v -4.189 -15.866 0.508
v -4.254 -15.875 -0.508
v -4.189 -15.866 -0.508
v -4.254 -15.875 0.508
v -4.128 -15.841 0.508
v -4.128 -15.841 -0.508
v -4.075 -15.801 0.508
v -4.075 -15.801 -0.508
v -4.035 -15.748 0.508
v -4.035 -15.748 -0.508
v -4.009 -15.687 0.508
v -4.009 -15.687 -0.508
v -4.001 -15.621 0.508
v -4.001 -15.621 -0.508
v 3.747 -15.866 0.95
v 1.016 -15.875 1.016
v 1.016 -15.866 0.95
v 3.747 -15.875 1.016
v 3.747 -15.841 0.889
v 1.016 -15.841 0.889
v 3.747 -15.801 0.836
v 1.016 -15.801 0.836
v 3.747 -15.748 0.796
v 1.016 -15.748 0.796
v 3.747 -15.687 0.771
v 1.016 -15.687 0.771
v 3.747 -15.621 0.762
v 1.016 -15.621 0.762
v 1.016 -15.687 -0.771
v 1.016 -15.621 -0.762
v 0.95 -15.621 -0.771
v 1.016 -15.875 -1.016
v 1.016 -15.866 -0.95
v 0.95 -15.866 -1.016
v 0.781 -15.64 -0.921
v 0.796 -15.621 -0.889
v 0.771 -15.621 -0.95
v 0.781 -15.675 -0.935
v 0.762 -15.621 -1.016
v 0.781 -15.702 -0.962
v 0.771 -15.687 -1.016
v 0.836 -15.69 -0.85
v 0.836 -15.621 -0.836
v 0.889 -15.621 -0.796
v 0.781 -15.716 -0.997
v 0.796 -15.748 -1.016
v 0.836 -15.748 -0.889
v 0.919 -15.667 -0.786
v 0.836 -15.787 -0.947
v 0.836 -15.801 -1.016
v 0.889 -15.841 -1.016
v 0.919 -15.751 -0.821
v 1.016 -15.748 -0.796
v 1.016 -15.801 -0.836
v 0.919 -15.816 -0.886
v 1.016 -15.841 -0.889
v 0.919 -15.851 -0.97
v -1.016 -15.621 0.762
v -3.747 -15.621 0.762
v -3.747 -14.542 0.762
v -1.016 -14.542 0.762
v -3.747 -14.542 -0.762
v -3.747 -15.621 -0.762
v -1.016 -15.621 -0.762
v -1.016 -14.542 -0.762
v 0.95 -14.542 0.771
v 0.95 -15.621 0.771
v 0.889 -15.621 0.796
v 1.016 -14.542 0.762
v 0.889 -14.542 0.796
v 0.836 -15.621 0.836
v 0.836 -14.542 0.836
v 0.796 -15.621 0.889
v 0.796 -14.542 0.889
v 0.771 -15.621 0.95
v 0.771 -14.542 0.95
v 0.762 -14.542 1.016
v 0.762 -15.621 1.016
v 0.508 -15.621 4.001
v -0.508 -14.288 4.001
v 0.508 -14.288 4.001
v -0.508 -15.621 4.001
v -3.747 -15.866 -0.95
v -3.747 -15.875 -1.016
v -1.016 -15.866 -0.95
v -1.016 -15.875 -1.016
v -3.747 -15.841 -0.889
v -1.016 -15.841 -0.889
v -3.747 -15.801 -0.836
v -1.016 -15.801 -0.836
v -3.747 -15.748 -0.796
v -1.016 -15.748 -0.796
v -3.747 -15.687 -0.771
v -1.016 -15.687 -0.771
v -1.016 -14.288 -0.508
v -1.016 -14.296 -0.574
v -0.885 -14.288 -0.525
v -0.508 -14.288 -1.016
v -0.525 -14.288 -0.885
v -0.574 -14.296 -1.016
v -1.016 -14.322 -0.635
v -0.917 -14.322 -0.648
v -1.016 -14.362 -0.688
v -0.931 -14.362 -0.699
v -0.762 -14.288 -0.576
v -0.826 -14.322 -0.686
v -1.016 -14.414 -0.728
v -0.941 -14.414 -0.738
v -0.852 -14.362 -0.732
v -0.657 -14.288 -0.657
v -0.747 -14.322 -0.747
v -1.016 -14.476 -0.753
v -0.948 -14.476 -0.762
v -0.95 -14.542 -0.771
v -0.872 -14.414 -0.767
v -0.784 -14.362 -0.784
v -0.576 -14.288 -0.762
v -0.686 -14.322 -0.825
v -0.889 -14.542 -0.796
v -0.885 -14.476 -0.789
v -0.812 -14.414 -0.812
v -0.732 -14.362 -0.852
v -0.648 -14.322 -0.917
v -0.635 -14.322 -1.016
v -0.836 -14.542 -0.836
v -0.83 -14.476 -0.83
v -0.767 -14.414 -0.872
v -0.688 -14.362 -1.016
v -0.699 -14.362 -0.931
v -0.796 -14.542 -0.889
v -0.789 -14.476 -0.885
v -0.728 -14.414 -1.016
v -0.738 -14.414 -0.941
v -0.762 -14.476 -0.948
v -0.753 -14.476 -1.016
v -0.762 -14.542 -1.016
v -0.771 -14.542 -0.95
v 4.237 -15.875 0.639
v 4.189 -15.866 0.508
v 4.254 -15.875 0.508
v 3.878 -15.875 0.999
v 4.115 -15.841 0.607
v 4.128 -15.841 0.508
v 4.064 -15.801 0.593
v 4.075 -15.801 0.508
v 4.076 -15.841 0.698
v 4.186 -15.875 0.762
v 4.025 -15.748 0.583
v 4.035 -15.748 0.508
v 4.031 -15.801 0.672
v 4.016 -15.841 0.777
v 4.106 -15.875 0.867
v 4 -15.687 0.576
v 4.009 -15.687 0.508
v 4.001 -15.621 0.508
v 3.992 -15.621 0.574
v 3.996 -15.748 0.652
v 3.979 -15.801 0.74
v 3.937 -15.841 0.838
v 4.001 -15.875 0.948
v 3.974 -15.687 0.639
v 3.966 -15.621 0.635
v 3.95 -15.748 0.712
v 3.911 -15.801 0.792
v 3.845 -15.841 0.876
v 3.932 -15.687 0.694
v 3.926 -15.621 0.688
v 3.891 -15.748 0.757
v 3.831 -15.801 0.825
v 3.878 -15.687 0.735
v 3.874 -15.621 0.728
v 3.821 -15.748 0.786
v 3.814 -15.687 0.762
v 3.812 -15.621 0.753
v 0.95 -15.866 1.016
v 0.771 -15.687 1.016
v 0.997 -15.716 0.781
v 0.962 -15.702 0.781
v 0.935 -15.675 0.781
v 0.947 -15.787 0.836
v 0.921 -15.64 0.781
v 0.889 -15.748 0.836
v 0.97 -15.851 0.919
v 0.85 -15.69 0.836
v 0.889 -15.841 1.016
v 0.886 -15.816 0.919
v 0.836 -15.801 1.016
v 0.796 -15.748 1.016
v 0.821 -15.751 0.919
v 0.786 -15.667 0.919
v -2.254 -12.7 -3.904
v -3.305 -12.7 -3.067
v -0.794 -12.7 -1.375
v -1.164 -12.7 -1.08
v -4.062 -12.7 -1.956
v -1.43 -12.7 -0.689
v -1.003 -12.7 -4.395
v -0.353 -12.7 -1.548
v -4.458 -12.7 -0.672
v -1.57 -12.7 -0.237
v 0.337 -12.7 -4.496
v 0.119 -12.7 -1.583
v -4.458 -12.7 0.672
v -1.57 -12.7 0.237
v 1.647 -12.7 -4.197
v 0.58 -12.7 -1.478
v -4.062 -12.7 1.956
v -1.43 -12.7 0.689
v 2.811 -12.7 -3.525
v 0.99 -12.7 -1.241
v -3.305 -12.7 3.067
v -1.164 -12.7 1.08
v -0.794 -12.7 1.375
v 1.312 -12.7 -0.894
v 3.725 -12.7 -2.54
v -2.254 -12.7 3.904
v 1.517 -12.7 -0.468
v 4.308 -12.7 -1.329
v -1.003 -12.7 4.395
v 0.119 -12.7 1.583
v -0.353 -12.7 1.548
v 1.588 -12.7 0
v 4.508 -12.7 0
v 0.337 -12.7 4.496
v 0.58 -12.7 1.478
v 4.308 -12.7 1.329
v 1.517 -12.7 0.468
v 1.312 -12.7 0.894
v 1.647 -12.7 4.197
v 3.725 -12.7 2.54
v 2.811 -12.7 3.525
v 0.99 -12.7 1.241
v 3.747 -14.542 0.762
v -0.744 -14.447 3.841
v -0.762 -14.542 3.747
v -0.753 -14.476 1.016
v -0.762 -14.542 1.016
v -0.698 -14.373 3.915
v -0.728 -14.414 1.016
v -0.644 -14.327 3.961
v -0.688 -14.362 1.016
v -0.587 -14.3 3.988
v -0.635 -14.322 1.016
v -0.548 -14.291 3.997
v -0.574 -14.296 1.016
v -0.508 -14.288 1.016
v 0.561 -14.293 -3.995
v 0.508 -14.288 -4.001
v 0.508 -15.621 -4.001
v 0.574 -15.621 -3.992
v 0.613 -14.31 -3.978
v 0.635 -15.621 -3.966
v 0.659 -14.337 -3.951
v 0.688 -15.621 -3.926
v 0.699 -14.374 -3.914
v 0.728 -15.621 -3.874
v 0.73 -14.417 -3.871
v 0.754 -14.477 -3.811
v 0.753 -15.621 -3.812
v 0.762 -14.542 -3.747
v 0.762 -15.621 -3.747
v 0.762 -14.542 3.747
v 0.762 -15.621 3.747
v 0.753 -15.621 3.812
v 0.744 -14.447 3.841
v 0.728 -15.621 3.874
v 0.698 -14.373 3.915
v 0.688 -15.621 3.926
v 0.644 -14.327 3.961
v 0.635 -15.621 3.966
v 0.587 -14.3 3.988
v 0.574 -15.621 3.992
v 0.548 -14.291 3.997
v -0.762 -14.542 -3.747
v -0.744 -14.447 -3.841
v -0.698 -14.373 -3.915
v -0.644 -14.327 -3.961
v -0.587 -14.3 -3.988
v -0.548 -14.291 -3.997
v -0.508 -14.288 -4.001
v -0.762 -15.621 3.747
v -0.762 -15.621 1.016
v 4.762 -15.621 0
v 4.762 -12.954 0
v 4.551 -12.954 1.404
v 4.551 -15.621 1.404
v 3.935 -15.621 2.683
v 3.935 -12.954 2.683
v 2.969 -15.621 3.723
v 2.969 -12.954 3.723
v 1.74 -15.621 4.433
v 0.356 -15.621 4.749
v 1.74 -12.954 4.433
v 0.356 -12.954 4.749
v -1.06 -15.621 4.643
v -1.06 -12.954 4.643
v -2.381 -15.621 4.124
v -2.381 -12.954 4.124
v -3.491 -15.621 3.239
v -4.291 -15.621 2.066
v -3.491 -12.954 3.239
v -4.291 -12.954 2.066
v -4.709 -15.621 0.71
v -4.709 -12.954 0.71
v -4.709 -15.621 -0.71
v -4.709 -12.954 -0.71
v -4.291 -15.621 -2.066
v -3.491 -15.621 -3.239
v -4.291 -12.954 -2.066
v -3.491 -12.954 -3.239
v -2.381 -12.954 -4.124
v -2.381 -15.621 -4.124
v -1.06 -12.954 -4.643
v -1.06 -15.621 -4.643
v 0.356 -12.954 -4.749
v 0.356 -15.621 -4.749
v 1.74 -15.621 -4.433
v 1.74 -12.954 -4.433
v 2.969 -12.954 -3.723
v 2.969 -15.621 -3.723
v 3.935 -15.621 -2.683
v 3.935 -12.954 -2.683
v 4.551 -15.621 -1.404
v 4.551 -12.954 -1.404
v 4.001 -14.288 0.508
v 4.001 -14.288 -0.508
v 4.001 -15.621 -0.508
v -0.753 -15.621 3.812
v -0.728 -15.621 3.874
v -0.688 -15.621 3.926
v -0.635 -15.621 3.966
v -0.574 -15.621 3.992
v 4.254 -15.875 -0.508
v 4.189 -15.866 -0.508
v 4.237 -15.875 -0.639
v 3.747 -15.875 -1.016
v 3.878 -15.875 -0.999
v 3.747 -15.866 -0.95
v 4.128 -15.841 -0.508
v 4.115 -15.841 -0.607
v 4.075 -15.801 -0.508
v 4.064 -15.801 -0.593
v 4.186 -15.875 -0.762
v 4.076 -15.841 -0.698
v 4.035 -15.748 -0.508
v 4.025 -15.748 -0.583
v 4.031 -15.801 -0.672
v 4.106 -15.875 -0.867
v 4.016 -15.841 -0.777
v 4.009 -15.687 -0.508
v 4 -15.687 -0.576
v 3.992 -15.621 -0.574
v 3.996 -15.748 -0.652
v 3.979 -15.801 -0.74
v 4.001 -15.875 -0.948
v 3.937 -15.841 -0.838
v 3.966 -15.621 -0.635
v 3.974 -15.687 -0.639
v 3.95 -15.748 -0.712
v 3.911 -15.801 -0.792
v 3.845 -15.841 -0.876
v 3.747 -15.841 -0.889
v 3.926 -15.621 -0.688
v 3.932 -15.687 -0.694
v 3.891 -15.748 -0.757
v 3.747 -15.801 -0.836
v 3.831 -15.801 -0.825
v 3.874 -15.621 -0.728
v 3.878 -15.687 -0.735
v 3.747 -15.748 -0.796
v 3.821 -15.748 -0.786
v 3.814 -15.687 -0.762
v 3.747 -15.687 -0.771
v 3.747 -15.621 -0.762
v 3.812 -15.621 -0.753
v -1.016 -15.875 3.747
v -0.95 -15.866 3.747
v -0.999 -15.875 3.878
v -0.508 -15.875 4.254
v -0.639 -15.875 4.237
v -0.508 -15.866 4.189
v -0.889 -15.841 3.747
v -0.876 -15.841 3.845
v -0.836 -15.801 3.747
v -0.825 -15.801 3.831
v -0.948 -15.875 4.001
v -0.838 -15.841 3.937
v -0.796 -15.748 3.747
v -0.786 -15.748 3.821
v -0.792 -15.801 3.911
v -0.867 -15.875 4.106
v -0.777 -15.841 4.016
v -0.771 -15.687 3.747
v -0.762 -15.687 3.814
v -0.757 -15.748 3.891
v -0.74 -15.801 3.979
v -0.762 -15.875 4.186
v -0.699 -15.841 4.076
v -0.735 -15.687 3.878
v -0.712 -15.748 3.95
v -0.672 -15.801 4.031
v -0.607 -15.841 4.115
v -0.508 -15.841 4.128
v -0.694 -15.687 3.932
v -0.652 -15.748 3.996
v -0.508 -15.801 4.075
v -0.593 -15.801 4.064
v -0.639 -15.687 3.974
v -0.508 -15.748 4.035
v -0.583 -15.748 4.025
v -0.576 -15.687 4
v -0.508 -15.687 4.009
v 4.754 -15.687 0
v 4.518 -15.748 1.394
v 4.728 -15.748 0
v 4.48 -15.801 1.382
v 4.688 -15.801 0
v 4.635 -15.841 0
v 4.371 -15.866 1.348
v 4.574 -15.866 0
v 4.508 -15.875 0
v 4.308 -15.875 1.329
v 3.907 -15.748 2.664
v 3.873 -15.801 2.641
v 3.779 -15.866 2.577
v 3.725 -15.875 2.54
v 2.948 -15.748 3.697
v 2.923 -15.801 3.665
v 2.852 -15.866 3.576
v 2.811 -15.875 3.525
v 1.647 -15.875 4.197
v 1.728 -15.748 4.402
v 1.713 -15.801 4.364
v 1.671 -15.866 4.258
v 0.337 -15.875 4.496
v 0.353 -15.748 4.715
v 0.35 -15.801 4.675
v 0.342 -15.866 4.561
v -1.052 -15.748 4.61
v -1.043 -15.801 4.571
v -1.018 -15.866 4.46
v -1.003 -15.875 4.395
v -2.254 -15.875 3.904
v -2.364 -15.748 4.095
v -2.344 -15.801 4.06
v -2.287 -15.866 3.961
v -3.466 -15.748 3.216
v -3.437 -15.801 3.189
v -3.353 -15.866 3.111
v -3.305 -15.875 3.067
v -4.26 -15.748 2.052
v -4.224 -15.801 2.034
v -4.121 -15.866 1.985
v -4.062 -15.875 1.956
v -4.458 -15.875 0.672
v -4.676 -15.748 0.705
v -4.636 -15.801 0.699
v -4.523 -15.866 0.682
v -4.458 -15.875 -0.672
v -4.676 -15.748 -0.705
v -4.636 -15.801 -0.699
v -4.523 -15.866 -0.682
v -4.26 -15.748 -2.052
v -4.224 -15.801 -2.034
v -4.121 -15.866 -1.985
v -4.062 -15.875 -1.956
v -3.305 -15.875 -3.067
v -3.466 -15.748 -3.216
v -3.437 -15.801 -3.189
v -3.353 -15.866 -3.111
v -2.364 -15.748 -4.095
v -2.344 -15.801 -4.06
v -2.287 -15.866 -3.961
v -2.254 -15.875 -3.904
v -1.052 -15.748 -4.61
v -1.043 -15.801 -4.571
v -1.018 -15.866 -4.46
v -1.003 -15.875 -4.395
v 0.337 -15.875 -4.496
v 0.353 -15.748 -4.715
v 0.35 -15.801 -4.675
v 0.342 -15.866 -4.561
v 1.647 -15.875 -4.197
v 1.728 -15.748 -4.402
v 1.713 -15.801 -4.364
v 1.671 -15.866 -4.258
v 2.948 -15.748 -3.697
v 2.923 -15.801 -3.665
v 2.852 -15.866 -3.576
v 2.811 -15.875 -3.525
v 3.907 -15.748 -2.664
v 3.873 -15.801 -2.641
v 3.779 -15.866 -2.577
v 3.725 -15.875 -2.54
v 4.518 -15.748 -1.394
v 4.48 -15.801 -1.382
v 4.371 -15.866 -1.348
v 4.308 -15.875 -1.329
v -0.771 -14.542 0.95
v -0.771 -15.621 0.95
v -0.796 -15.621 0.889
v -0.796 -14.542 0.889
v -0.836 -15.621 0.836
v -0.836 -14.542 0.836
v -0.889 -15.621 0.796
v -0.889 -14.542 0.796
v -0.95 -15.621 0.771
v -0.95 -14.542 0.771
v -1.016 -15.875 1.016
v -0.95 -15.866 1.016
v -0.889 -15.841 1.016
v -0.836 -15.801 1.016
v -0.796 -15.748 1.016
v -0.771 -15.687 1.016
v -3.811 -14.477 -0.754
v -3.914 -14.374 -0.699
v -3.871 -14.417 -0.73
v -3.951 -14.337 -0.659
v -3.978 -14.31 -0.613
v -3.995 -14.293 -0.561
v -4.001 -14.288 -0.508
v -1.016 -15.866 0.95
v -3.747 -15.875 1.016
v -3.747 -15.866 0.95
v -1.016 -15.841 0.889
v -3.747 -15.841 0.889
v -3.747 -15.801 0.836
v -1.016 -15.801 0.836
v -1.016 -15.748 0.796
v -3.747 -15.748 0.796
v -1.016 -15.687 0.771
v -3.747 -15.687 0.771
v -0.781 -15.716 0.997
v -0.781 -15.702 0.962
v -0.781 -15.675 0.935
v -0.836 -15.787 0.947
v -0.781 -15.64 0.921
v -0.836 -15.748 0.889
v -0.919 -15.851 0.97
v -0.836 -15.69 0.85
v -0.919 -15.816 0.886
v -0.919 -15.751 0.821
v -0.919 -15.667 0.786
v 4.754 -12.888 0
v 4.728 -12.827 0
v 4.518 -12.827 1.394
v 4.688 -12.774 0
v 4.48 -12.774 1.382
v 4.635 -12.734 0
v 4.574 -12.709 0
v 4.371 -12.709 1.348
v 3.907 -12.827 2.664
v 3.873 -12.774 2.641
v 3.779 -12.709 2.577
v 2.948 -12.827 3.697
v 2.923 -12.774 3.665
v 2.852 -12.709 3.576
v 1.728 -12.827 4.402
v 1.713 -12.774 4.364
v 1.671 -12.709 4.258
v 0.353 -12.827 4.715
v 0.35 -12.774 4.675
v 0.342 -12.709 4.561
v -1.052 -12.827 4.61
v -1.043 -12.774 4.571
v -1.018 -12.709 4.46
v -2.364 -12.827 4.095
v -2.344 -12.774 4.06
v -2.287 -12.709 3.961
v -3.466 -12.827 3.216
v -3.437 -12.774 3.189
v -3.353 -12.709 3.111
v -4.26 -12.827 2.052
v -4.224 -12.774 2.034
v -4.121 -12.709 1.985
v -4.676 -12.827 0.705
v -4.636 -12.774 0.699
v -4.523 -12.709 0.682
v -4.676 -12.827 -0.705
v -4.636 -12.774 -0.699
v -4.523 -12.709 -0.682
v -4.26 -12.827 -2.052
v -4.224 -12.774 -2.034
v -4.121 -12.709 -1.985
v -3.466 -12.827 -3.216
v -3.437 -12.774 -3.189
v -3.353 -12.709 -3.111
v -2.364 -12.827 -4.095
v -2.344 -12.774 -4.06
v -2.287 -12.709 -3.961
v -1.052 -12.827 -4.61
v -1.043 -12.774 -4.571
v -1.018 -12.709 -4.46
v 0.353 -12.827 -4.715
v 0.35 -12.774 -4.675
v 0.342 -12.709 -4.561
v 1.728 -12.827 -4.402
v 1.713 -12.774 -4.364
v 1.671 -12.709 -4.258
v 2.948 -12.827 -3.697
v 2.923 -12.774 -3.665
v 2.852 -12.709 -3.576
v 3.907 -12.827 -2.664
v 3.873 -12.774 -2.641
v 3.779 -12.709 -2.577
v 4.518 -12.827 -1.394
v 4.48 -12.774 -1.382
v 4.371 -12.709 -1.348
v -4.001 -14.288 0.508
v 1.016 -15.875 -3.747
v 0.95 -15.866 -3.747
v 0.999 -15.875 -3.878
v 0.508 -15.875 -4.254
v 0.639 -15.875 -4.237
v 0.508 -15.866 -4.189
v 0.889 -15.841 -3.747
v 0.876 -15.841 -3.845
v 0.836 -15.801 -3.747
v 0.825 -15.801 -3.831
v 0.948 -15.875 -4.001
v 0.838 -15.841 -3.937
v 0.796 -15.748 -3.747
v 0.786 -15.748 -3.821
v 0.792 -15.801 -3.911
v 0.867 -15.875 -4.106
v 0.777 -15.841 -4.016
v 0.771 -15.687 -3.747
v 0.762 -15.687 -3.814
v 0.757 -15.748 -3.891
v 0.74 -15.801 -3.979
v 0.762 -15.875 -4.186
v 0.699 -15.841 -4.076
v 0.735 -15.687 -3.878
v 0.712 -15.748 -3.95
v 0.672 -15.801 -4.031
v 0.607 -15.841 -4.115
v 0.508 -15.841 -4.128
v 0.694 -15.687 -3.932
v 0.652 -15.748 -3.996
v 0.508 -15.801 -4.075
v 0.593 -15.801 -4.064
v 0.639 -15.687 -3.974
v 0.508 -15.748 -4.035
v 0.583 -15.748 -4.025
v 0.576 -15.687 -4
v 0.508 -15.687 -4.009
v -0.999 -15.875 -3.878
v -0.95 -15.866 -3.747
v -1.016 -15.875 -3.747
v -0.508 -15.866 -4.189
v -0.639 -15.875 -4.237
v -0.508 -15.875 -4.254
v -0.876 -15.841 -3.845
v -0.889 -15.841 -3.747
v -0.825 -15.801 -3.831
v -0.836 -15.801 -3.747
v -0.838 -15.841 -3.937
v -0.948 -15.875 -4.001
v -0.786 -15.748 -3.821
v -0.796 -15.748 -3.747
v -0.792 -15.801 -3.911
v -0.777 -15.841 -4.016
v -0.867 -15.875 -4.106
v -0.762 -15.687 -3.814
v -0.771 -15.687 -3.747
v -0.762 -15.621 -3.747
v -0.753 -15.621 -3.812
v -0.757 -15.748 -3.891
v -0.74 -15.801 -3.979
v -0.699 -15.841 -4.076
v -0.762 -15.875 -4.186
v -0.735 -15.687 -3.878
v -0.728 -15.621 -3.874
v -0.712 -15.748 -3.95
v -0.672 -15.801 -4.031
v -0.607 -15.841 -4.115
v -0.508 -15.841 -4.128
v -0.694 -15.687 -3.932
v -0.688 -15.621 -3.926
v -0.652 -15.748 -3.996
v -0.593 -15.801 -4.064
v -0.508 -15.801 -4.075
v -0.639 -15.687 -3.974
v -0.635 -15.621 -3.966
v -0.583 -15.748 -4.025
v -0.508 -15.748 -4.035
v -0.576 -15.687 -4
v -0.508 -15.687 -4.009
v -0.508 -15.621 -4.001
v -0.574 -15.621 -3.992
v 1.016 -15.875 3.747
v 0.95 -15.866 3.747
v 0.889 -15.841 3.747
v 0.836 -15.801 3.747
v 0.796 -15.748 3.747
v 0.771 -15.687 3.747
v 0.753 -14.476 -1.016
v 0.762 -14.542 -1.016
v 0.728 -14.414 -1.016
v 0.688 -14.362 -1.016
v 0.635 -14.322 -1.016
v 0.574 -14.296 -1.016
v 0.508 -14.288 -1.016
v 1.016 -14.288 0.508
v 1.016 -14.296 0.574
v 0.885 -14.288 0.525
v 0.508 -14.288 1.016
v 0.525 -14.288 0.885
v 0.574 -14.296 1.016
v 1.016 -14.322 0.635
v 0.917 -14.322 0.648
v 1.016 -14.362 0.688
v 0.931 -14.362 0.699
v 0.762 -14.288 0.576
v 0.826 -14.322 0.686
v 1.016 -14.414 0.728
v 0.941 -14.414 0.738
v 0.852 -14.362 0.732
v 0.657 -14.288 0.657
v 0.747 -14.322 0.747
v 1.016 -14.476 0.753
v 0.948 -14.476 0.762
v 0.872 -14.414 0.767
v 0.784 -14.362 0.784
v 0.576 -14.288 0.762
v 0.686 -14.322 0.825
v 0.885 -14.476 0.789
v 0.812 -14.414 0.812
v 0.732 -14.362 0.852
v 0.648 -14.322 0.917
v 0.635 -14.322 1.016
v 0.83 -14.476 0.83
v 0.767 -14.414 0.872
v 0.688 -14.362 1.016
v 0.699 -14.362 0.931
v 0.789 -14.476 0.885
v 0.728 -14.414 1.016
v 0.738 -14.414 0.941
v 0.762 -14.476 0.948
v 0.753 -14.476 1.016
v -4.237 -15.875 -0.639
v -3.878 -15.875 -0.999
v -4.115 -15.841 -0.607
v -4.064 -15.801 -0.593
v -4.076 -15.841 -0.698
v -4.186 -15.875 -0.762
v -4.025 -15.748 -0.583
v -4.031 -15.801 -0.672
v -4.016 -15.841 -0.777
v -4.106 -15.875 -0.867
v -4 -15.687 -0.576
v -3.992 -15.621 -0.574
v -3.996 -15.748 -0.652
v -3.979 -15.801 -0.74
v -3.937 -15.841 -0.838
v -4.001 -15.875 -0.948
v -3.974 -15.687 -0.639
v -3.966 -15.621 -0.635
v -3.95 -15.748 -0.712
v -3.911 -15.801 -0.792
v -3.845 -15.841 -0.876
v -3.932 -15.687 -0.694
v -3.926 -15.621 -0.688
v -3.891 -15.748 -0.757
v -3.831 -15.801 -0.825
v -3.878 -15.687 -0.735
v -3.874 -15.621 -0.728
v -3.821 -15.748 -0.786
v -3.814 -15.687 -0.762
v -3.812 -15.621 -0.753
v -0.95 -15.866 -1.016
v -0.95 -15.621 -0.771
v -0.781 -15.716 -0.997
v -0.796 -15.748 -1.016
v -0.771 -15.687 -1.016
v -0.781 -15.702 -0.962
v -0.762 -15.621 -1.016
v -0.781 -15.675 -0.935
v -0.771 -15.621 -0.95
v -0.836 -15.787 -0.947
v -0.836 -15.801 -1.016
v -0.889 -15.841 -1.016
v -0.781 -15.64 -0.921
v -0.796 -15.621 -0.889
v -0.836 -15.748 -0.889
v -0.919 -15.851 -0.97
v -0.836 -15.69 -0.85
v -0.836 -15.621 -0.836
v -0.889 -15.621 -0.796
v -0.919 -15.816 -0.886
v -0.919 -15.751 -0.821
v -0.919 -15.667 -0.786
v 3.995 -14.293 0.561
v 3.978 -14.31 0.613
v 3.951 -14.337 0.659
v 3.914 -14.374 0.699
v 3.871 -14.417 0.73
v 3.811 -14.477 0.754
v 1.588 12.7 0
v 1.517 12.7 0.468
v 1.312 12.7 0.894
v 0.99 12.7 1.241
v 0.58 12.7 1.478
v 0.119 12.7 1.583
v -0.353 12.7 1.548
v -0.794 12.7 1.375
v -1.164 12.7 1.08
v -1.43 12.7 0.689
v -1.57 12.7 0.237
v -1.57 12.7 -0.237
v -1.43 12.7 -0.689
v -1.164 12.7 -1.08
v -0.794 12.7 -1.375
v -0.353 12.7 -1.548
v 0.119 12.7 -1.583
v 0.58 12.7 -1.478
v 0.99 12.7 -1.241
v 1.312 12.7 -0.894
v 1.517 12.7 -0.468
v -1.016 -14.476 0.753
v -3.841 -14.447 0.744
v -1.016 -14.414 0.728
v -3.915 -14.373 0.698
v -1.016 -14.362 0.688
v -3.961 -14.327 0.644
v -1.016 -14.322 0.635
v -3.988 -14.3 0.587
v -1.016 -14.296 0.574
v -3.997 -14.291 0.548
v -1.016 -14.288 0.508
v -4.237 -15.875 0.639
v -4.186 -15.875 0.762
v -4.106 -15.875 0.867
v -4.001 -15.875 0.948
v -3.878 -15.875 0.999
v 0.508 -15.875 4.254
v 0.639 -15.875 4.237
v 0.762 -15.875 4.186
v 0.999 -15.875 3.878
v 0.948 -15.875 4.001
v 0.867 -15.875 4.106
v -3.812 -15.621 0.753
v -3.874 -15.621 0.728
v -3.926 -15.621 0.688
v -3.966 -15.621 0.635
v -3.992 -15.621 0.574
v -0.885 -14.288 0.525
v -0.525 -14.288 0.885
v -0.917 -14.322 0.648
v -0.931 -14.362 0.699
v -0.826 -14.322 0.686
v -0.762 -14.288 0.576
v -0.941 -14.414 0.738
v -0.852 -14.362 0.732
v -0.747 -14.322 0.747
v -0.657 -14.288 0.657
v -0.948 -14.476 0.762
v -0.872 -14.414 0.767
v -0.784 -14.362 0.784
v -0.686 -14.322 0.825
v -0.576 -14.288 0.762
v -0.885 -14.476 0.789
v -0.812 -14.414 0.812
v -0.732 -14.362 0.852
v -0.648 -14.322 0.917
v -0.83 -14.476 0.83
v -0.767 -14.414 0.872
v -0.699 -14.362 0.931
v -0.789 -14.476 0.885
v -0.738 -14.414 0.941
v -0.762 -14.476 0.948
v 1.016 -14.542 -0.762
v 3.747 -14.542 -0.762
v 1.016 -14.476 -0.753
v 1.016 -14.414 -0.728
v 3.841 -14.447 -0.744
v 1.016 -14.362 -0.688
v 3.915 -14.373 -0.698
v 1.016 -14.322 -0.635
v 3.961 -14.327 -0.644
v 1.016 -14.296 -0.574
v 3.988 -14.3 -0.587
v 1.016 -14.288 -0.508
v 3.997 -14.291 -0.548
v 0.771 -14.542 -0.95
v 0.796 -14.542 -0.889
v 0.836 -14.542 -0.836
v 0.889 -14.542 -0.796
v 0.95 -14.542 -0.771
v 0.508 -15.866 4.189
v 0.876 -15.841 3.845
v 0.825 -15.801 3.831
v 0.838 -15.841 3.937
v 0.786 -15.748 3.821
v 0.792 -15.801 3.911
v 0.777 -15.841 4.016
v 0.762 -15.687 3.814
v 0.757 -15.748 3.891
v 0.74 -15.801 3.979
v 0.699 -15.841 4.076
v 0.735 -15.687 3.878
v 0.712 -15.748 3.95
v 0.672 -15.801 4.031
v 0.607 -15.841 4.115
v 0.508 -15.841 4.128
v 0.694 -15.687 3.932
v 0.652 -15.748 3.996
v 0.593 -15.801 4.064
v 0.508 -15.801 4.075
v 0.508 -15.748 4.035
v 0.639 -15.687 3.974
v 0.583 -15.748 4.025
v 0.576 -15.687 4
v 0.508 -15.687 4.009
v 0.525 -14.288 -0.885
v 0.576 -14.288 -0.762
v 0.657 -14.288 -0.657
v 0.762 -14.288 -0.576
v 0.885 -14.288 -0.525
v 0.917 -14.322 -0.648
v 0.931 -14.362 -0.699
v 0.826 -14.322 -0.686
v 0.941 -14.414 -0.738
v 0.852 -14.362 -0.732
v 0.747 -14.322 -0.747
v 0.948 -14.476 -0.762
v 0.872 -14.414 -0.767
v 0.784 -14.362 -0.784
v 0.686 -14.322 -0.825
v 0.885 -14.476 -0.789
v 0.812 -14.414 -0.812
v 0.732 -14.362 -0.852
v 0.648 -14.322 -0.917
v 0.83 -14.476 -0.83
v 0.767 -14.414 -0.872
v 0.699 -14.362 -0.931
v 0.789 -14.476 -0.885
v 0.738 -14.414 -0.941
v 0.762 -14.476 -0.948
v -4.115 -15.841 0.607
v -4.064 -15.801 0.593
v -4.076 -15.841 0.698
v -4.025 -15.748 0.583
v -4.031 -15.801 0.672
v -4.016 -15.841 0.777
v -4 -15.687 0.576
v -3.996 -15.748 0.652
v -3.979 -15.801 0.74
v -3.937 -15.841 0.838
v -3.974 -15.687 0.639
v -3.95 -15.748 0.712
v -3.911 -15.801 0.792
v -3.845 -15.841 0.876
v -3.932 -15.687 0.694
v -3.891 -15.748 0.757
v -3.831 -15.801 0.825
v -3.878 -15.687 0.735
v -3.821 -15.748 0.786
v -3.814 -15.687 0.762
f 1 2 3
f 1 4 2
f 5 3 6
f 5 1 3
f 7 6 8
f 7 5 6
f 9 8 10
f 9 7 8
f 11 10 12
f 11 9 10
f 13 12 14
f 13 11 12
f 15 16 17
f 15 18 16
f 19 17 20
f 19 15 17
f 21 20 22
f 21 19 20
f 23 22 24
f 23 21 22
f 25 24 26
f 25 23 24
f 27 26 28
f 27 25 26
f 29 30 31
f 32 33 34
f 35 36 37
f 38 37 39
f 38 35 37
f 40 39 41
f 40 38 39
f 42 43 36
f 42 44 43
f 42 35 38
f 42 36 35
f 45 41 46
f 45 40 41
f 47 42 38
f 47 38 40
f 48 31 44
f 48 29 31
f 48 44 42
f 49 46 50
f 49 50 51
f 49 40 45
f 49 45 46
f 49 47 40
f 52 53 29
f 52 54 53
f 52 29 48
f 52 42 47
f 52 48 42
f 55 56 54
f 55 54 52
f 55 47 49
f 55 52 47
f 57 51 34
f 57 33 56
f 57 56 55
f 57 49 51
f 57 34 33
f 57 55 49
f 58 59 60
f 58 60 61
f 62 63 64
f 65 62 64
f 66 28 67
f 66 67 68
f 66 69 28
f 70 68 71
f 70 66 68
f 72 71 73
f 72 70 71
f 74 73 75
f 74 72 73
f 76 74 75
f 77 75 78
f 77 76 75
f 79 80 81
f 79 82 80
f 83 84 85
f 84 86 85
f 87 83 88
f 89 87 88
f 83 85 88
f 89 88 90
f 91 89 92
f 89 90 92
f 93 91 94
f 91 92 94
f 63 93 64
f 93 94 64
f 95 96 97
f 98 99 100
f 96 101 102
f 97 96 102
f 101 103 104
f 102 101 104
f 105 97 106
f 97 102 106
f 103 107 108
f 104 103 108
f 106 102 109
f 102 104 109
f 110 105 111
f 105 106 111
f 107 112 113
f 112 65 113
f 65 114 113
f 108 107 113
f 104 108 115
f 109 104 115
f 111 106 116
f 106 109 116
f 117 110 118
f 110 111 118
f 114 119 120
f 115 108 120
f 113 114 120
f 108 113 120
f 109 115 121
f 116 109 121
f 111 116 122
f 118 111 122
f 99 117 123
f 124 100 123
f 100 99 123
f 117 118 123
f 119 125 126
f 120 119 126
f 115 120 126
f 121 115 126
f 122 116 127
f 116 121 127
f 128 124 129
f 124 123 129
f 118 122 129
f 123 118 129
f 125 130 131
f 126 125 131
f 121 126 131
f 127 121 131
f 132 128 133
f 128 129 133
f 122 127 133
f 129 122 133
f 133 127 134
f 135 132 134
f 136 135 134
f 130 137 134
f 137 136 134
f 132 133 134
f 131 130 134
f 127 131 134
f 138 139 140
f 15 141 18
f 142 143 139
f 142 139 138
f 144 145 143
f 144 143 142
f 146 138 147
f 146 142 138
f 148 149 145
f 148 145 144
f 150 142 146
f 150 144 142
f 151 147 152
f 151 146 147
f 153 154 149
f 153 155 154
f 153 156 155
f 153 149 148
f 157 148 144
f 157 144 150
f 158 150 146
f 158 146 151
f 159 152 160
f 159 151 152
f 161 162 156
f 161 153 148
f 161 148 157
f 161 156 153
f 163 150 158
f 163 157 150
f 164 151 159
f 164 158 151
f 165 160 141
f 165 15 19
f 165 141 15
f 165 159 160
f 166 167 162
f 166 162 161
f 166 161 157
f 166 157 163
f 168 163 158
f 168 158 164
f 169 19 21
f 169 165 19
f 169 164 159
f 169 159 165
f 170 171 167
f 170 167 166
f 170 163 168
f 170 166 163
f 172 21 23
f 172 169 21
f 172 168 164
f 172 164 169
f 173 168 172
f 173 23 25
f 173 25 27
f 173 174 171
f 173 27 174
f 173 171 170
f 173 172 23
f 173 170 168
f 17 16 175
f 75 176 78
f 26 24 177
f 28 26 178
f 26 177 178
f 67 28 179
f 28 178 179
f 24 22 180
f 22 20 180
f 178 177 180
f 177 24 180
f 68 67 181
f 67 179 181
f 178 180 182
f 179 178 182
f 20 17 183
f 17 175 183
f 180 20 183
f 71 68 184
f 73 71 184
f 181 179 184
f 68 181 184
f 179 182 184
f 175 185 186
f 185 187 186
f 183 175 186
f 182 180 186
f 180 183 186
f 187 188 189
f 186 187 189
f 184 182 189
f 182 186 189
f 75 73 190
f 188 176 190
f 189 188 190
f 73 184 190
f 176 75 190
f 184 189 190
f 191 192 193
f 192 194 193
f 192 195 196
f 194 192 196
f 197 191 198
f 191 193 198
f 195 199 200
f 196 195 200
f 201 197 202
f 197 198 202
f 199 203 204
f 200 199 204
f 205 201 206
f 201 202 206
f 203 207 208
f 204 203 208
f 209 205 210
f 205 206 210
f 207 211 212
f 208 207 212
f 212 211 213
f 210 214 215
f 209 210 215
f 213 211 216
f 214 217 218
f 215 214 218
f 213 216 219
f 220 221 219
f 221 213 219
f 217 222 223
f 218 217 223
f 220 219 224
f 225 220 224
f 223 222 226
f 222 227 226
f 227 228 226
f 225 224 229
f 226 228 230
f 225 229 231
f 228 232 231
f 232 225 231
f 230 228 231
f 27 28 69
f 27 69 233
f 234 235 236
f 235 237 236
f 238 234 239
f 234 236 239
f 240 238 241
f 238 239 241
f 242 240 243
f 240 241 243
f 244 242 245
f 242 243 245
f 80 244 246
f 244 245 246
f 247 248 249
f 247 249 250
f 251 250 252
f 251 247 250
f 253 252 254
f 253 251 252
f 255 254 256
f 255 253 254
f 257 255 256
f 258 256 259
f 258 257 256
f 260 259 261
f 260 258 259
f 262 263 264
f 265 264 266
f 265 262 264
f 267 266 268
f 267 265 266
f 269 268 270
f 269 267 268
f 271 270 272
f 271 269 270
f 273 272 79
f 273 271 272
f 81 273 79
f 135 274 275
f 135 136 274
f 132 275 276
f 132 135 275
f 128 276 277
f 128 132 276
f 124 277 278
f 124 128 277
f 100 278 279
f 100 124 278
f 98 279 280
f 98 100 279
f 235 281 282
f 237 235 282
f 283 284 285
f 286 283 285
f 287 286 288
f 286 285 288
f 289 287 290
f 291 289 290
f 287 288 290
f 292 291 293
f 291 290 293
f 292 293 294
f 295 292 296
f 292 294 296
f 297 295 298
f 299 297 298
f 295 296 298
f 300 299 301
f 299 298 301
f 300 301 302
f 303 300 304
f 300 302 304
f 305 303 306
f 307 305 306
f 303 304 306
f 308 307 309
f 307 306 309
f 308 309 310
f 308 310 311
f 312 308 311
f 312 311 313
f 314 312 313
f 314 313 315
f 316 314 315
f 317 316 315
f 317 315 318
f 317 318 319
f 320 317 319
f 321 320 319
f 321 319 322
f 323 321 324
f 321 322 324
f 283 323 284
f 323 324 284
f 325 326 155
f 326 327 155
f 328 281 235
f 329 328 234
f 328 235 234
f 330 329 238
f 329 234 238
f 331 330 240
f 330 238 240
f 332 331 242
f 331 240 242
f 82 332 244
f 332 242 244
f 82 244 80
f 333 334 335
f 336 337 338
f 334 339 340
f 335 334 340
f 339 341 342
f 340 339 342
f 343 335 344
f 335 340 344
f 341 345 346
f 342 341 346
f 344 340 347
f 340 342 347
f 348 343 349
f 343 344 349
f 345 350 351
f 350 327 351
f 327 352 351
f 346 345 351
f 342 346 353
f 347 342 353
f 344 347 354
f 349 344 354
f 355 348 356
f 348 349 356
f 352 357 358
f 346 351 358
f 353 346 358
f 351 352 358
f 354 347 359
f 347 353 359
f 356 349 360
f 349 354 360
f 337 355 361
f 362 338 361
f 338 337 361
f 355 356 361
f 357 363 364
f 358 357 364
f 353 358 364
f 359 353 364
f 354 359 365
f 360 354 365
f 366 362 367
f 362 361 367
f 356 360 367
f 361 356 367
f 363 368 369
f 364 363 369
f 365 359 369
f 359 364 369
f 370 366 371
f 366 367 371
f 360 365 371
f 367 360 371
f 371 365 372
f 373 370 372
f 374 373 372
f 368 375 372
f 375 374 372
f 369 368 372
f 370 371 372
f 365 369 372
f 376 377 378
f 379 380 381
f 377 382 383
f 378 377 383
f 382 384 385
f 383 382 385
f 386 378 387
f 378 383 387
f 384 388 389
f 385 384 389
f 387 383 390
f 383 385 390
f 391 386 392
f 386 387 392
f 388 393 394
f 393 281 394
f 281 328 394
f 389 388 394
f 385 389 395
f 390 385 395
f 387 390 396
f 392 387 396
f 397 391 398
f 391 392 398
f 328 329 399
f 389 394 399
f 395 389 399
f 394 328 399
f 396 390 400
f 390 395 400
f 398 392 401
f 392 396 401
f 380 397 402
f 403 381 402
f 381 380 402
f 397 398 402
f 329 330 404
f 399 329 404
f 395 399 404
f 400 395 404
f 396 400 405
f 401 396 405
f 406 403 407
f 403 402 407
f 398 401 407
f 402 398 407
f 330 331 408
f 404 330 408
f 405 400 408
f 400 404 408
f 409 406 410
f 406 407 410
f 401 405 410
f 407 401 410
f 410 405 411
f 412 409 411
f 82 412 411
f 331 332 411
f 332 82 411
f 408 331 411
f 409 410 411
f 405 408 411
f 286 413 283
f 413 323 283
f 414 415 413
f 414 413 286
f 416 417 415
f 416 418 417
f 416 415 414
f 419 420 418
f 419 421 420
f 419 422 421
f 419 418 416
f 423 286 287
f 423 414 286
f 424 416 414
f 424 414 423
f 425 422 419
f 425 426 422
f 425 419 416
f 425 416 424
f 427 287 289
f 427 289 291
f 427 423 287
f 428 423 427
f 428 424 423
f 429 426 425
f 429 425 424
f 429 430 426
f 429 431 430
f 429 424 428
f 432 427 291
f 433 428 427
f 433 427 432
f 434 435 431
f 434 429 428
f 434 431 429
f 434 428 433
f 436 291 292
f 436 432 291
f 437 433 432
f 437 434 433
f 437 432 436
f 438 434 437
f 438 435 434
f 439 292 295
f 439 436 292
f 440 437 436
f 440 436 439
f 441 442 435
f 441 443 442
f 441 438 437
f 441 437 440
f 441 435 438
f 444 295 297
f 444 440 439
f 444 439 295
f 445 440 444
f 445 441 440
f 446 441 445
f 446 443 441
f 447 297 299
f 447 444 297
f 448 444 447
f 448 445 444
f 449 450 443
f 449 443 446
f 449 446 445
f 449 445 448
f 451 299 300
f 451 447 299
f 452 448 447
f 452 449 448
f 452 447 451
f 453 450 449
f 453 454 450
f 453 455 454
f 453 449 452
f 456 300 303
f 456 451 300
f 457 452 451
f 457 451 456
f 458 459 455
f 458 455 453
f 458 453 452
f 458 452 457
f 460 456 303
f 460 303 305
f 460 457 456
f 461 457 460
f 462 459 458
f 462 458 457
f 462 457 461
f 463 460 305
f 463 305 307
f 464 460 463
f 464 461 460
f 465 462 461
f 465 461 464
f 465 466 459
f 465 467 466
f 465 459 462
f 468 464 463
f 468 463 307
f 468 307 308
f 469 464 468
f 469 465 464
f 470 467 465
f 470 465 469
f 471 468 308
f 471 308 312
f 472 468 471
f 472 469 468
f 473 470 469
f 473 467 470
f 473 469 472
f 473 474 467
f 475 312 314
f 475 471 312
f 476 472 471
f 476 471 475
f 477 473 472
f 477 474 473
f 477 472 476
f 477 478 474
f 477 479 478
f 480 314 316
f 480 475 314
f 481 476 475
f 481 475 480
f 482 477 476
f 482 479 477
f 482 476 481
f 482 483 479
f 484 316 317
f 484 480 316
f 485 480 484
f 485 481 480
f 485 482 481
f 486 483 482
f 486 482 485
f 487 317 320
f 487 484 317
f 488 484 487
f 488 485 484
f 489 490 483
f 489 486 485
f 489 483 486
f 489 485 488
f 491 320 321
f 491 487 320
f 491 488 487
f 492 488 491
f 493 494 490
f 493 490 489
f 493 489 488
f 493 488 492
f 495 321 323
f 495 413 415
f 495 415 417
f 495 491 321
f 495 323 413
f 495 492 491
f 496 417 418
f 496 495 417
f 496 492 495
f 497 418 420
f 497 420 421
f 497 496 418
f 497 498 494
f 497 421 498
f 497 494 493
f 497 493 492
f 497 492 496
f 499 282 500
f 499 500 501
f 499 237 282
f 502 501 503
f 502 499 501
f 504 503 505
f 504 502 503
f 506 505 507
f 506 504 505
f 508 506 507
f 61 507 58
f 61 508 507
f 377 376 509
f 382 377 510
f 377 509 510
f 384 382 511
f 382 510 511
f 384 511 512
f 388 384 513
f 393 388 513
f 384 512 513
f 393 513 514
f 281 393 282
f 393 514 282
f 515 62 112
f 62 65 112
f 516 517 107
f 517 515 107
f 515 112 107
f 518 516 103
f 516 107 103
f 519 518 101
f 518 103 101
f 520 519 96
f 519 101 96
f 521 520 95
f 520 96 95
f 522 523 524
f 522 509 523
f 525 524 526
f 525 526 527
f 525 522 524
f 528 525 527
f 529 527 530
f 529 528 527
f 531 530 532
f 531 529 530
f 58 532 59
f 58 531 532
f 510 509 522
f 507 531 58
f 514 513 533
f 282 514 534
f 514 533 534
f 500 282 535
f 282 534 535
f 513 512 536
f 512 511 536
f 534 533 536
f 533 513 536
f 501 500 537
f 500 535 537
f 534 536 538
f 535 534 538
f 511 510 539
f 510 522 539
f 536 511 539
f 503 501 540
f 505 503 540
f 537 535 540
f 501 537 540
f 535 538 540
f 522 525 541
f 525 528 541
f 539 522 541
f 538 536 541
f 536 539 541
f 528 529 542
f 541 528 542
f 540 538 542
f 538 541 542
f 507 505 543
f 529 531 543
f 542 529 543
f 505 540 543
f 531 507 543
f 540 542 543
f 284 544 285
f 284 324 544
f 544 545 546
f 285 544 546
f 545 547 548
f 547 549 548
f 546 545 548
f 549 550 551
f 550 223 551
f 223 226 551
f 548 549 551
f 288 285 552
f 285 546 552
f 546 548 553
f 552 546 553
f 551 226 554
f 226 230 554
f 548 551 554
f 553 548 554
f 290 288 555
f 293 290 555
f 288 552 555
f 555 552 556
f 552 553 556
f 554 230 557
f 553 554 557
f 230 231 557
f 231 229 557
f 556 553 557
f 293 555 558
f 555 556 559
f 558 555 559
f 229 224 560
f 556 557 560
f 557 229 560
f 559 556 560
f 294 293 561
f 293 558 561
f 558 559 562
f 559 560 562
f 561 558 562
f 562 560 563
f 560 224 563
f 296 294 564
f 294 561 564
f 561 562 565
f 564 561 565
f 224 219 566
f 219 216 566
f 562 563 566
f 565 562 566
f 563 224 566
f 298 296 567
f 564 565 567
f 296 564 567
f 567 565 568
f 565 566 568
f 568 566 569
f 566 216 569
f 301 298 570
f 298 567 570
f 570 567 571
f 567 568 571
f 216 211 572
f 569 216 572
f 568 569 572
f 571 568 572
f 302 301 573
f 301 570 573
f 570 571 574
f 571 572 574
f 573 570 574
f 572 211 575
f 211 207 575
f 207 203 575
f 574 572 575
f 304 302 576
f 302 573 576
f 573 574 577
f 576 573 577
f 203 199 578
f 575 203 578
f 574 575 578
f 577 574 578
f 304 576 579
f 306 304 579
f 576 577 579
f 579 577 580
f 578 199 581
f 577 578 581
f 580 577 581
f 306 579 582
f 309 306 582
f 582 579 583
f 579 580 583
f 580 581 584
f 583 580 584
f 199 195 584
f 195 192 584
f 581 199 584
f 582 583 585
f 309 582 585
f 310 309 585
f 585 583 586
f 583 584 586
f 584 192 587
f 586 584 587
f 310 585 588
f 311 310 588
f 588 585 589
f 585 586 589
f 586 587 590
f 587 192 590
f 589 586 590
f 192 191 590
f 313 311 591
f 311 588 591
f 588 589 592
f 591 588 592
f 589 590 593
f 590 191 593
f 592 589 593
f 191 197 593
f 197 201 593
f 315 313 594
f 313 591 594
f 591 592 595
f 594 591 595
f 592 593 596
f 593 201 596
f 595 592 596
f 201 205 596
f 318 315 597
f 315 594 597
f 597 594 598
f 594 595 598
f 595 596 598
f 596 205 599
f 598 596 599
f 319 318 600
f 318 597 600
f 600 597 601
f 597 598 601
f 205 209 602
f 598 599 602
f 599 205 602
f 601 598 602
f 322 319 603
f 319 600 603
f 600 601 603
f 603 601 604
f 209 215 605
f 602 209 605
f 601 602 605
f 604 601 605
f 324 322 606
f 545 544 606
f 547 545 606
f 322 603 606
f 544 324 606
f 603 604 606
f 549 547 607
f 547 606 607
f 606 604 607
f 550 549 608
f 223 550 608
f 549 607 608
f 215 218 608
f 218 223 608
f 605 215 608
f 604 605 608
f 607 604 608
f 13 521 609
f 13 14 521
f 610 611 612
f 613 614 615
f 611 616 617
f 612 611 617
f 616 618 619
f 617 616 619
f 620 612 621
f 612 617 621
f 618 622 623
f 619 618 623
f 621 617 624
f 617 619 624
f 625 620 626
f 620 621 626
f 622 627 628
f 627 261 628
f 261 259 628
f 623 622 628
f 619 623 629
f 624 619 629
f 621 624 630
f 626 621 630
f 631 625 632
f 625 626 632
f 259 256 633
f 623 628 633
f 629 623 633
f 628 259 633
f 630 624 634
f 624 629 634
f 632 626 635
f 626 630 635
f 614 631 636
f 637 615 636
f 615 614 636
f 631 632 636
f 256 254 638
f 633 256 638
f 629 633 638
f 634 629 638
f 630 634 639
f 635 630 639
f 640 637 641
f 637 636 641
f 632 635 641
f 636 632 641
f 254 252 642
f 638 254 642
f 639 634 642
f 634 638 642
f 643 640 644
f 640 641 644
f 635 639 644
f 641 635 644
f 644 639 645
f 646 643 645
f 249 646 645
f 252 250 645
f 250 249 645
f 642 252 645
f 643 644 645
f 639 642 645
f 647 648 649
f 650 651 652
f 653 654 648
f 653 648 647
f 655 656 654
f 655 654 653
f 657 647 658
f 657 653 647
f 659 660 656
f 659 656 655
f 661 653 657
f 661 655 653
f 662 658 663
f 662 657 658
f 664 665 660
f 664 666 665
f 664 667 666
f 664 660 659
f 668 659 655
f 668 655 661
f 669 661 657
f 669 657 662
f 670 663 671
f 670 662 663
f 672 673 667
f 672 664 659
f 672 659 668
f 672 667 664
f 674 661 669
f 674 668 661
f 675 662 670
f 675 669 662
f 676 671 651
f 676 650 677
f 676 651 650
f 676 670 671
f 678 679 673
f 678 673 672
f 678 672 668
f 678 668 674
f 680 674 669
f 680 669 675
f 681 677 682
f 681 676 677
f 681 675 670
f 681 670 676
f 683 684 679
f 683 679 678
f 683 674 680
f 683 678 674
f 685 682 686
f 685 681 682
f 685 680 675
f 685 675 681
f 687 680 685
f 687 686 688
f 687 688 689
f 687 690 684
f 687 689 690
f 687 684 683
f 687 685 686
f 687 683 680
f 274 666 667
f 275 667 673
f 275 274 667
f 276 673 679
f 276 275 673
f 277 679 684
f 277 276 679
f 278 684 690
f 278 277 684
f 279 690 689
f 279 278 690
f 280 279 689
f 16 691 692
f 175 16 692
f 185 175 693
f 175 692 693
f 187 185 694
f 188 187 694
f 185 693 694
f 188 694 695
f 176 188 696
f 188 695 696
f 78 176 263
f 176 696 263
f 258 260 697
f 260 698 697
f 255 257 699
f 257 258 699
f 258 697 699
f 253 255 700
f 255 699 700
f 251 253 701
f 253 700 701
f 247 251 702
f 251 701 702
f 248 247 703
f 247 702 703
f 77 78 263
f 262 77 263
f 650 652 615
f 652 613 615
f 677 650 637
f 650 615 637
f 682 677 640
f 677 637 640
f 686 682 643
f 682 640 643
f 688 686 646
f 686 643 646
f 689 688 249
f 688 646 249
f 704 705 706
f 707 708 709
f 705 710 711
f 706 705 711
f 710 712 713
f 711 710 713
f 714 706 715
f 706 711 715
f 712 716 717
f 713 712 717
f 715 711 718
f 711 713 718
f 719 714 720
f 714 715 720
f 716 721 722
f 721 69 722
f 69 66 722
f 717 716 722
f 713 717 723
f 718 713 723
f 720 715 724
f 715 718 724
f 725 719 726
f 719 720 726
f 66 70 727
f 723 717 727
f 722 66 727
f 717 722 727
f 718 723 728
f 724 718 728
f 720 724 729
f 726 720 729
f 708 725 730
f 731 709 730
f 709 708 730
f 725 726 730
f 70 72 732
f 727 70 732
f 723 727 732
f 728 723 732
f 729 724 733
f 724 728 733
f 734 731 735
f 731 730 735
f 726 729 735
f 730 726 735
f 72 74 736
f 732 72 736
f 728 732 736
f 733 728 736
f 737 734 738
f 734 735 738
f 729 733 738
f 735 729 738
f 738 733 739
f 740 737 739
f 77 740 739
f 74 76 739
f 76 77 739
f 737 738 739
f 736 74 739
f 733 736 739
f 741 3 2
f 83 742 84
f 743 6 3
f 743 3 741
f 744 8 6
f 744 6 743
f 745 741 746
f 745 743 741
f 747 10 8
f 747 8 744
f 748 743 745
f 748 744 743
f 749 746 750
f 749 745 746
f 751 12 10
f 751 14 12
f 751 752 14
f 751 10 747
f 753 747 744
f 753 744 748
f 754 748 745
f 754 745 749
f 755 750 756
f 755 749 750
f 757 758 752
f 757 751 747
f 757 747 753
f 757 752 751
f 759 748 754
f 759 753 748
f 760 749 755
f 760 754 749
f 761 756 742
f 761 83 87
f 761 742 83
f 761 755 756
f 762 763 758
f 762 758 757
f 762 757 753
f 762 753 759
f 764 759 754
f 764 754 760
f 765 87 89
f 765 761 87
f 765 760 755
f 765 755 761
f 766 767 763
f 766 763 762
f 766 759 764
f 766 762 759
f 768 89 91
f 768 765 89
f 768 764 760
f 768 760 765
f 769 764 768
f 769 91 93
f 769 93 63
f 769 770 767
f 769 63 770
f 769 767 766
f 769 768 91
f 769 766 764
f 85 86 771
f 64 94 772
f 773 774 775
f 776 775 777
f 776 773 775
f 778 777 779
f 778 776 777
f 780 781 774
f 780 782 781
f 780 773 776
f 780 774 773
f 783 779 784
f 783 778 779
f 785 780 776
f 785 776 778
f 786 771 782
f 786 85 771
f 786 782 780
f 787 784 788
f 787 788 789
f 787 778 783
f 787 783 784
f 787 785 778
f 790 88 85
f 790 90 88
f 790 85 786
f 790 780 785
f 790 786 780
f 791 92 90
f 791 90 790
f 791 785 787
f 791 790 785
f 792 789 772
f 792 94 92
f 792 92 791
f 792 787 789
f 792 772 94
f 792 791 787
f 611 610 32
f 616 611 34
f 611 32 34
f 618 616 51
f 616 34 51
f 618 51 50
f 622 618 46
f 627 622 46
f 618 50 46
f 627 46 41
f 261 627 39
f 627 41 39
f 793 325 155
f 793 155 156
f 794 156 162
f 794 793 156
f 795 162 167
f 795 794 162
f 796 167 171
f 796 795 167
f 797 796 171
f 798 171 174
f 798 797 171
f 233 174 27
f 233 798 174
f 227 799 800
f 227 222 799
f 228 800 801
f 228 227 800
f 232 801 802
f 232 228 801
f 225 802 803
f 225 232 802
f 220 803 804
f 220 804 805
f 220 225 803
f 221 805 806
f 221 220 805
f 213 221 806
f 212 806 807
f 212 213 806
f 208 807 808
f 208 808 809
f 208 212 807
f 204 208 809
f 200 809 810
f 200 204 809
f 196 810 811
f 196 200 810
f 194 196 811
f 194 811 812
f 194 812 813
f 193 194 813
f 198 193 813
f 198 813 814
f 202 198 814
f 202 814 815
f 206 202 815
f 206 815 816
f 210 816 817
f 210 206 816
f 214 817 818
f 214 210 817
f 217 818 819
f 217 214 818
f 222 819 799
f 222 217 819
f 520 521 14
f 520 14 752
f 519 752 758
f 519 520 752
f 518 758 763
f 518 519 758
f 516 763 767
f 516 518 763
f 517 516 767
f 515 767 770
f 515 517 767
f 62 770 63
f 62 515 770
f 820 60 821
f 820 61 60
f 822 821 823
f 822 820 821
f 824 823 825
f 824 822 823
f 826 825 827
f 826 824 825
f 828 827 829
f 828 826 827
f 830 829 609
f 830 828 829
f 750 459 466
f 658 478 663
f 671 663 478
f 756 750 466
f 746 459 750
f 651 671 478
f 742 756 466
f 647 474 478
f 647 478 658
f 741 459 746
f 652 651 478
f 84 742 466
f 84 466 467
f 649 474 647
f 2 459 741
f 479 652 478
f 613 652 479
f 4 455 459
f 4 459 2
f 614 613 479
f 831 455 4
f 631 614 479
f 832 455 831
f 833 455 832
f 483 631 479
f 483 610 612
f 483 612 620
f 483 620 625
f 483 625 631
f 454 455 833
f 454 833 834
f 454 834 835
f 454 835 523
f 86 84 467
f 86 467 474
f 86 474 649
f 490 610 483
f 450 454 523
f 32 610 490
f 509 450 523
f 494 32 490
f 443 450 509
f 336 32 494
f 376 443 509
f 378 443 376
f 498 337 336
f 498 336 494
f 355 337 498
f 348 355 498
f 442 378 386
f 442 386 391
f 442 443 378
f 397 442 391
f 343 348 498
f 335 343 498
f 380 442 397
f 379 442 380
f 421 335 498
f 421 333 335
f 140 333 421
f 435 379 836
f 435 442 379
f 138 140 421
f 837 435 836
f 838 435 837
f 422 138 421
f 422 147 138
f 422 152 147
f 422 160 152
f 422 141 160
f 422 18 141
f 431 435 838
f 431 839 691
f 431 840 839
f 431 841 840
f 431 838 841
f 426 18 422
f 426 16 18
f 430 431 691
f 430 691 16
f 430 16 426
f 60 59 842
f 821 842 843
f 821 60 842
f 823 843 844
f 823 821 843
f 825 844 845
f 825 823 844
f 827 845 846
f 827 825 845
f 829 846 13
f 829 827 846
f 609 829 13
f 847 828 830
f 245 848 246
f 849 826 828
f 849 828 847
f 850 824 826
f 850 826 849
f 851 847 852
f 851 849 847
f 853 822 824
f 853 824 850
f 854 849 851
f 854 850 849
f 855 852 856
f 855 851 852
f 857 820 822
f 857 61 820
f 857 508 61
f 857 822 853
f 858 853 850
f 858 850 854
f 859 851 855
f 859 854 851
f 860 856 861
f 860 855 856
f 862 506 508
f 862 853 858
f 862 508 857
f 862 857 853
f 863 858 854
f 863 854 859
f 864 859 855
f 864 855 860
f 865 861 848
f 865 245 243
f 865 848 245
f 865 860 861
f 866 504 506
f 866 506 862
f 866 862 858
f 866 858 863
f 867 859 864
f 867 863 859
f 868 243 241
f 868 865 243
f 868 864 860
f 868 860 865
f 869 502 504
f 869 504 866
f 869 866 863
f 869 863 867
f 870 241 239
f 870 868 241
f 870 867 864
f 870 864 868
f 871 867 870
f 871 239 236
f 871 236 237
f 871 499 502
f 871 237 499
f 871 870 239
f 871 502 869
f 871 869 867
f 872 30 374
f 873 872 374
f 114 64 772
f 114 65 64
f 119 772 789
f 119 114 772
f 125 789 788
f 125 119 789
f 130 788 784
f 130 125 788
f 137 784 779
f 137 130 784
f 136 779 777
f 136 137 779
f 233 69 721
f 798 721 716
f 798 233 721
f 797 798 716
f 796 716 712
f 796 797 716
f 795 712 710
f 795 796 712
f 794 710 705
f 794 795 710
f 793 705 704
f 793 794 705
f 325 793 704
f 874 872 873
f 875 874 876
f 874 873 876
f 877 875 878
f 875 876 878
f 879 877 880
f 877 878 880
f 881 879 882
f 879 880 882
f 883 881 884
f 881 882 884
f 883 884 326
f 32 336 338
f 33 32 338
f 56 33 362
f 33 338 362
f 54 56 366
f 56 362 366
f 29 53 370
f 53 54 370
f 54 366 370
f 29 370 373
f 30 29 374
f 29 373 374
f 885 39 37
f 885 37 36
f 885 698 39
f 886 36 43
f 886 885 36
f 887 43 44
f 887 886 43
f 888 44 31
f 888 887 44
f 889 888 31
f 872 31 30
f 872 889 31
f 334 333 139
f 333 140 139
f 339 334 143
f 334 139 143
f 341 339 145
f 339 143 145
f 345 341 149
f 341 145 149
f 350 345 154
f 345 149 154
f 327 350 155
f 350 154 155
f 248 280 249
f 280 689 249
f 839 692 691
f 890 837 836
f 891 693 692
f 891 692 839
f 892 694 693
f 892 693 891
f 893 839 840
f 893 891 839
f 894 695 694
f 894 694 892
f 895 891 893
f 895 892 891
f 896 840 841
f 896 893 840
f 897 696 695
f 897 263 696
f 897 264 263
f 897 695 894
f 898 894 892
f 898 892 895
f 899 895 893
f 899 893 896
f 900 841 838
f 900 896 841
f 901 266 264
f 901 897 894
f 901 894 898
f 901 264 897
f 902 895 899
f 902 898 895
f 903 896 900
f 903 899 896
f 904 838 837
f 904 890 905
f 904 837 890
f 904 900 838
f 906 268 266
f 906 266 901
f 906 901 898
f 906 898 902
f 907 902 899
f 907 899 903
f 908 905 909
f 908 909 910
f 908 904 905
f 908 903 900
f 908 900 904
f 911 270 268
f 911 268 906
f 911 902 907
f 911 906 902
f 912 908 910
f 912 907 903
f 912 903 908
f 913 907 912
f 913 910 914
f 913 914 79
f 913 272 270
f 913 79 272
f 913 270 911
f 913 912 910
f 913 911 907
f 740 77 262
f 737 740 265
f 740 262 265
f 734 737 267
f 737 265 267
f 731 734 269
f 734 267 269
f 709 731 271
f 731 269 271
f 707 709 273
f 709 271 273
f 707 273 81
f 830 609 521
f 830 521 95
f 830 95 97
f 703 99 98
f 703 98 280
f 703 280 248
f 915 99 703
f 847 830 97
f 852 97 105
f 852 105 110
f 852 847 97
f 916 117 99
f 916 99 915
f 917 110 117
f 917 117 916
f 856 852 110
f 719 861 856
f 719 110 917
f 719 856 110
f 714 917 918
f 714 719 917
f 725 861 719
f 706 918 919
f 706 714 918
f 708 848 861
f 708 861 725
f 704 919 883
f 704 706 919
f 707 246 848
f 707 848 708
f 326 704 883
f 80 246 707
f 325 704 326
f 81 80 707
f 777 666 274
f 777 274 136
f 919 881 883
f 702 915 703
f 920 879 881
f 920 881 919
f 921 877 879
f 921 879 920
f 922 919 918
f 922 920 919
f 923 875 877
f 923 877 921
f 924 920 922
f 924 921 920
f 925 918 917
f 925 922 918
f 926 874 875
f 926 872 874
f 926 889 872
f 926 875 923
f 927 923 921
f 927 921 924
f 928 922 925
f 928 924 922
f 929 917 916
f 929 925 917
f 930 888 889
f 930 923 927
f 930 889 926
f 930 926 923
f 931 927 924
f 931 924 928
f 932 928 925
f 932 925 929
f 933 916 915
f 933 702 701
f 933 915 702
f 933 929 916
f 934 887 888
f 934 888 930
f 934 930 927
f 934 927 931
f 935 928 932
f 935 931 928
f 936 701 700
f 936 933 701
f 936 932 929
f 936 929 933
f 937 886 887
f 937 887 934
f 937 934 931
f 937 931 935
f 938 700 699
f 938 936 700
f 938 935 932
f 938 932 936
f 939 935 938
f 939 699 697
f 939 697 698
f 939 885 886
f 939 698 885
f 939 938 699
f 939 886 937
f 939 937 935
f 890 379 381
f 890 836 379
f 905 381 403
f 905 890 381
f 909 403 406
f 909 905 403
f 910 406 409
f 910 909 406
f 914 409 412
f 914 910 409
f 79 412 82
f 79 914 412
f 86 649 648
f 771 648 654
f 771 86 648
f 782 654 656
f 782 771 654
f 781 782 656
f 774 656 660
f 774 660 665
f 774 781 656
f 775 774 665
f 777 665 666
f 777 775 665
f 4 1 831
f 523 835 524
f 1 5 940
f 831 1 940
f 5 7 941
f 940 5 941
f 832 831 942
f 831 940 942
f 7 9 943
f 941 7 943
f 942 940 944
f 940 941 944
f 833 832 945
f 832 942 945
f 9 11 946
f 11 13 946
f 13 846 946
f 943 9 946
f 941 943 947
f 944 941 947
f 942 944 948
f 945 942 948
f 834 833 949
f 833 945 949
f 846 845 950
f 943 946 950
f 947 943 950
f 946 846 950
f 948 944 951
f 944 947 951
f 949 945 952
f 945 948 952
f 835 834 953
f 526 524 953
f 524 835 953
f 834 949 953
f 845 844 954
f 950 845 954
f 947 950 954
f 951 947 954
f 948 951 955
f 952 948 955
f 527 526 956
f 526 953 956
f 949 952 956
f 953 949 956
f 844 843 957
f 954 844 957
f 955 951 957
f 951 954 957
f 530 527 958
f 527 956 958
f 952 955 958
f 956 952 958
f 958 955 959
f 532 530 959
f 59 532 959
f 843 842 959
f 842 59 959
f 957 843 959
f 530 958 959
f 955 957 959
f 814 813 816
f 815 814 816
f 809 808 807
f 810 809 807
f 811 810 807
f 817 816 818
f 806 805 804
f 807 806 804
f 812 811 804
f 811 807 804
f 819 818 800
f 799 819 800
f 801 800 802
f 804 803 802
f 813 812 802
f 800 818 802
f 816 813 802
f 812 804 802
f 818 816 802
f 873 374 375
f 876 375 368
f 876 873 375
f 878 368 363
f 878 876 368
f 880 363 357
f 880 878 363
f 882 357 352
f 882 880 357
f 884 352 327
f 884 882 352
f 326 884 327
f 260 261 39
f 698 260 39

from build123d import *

# Parameters (mm, degrees)
F0_R     = 1.5875
F1_DEPTH = 12.7
F2_R     = 4.7625
F3_DEPTH = 3.175
F4_W     = 1.524
F4_H     = 3.2385
F4_H_2   = 1.524
F4_W_2   = 3.2385
F5_DEPTH = 1.5875
F6_R     = 0.254


with BuildPart() as f1:
    # F0 (on Front) → F1 (new body, symmetric)
    with BuildSketch(Plane.XZ):
        Circle(F0_R)
    extrude(amount=F1_DEPTH, both=True)

    # F2 (on face) → F3 (join)
    with BuildSketch(Plane.XZ.offset(12.7)):
        Circle(F2_R)
    extrude(amount=F3_DEPTH)

    # F4 (on face) → F5 (cut)
    with BuildSketch(Plane.XZ.offset(15.875)):
        with Locations((0, 2.38125)):
            Rectangle(F4_W, F4_H)
        Rectangle(F4_W, F4_H_2)
        with Locations((-2.38125, 0)):
            Rectangle(F4_W_2, F4_H_2)
        with Locations((2.38125, 0)):
            Rectangle(F4_W_2, F4_H_2)
        with Locations((0, -2.38125)):
            Rectangle(F4_W, F4_H)
    extrude(amount=-F5_DEPTH, mode=Mode.SUBTRACT)

    # F6
    f6_edges = [f1.edges().sort_by_distance(p)[0] for p in [
        (-4.7625, -15.875, 0),
        (-2.38125, -15.875, 0.762),
        (-0.762, -15.875, 2.38125),
        (0.762, -15.875, 2.38125),
        (-2.38125, -15.875, -0.762),
        (-0.762, -15.875, -2.38125),
        (2.38125, -15.875, -0.762),
        (2.38125, -15.875, 0.762),
        (-0.762, -15.08125, 0.762),
        (-4.0005, -15.08125, 0.762),
        (-2.38125, -14.2875, 0.762),
        (4.0005, -15.08125, 0.762),
        (0.762, -15.08125, 0.762),
        (2.38125, -14.2875, 0.762),
        (-4.0005, -15.08125, -0.762),
        (-0.762, -15.08125, -0.762),
        (-2.38125, -14.2875, -0.762),
        (0.762, -15.08125, -0.762),
        (4.0005, -15.08125, -0.762),
        (2.38125, -14.2875, -0.762),
        (0, -15.875, 4.0005),
        (0, -15.875, -4.0005),
        (0.762, -15.08125, 4.0005),
        (-0.762, -15.08125, 4.0005),
        (0.762, -15.08125, -4.0005),
        (-0.762, -15.08125, -4.0005),
        (-4.7625, -12.7, 0),
        (-4.0005, -15.875, 0),
        (0.762, -15.875, -2.38125),
        (4.0005, -15.875, 0),
        (-0.762, -14.2875, 2.38125),
        (-0.762, -14.2875, -2.38125),
        (0.762, -14.2875, -2.38125),
        (0.762, -14.2875, 2.38125),
    ]]
    fillet(f6_edges, radius=F6_R)


solid = f1.part
